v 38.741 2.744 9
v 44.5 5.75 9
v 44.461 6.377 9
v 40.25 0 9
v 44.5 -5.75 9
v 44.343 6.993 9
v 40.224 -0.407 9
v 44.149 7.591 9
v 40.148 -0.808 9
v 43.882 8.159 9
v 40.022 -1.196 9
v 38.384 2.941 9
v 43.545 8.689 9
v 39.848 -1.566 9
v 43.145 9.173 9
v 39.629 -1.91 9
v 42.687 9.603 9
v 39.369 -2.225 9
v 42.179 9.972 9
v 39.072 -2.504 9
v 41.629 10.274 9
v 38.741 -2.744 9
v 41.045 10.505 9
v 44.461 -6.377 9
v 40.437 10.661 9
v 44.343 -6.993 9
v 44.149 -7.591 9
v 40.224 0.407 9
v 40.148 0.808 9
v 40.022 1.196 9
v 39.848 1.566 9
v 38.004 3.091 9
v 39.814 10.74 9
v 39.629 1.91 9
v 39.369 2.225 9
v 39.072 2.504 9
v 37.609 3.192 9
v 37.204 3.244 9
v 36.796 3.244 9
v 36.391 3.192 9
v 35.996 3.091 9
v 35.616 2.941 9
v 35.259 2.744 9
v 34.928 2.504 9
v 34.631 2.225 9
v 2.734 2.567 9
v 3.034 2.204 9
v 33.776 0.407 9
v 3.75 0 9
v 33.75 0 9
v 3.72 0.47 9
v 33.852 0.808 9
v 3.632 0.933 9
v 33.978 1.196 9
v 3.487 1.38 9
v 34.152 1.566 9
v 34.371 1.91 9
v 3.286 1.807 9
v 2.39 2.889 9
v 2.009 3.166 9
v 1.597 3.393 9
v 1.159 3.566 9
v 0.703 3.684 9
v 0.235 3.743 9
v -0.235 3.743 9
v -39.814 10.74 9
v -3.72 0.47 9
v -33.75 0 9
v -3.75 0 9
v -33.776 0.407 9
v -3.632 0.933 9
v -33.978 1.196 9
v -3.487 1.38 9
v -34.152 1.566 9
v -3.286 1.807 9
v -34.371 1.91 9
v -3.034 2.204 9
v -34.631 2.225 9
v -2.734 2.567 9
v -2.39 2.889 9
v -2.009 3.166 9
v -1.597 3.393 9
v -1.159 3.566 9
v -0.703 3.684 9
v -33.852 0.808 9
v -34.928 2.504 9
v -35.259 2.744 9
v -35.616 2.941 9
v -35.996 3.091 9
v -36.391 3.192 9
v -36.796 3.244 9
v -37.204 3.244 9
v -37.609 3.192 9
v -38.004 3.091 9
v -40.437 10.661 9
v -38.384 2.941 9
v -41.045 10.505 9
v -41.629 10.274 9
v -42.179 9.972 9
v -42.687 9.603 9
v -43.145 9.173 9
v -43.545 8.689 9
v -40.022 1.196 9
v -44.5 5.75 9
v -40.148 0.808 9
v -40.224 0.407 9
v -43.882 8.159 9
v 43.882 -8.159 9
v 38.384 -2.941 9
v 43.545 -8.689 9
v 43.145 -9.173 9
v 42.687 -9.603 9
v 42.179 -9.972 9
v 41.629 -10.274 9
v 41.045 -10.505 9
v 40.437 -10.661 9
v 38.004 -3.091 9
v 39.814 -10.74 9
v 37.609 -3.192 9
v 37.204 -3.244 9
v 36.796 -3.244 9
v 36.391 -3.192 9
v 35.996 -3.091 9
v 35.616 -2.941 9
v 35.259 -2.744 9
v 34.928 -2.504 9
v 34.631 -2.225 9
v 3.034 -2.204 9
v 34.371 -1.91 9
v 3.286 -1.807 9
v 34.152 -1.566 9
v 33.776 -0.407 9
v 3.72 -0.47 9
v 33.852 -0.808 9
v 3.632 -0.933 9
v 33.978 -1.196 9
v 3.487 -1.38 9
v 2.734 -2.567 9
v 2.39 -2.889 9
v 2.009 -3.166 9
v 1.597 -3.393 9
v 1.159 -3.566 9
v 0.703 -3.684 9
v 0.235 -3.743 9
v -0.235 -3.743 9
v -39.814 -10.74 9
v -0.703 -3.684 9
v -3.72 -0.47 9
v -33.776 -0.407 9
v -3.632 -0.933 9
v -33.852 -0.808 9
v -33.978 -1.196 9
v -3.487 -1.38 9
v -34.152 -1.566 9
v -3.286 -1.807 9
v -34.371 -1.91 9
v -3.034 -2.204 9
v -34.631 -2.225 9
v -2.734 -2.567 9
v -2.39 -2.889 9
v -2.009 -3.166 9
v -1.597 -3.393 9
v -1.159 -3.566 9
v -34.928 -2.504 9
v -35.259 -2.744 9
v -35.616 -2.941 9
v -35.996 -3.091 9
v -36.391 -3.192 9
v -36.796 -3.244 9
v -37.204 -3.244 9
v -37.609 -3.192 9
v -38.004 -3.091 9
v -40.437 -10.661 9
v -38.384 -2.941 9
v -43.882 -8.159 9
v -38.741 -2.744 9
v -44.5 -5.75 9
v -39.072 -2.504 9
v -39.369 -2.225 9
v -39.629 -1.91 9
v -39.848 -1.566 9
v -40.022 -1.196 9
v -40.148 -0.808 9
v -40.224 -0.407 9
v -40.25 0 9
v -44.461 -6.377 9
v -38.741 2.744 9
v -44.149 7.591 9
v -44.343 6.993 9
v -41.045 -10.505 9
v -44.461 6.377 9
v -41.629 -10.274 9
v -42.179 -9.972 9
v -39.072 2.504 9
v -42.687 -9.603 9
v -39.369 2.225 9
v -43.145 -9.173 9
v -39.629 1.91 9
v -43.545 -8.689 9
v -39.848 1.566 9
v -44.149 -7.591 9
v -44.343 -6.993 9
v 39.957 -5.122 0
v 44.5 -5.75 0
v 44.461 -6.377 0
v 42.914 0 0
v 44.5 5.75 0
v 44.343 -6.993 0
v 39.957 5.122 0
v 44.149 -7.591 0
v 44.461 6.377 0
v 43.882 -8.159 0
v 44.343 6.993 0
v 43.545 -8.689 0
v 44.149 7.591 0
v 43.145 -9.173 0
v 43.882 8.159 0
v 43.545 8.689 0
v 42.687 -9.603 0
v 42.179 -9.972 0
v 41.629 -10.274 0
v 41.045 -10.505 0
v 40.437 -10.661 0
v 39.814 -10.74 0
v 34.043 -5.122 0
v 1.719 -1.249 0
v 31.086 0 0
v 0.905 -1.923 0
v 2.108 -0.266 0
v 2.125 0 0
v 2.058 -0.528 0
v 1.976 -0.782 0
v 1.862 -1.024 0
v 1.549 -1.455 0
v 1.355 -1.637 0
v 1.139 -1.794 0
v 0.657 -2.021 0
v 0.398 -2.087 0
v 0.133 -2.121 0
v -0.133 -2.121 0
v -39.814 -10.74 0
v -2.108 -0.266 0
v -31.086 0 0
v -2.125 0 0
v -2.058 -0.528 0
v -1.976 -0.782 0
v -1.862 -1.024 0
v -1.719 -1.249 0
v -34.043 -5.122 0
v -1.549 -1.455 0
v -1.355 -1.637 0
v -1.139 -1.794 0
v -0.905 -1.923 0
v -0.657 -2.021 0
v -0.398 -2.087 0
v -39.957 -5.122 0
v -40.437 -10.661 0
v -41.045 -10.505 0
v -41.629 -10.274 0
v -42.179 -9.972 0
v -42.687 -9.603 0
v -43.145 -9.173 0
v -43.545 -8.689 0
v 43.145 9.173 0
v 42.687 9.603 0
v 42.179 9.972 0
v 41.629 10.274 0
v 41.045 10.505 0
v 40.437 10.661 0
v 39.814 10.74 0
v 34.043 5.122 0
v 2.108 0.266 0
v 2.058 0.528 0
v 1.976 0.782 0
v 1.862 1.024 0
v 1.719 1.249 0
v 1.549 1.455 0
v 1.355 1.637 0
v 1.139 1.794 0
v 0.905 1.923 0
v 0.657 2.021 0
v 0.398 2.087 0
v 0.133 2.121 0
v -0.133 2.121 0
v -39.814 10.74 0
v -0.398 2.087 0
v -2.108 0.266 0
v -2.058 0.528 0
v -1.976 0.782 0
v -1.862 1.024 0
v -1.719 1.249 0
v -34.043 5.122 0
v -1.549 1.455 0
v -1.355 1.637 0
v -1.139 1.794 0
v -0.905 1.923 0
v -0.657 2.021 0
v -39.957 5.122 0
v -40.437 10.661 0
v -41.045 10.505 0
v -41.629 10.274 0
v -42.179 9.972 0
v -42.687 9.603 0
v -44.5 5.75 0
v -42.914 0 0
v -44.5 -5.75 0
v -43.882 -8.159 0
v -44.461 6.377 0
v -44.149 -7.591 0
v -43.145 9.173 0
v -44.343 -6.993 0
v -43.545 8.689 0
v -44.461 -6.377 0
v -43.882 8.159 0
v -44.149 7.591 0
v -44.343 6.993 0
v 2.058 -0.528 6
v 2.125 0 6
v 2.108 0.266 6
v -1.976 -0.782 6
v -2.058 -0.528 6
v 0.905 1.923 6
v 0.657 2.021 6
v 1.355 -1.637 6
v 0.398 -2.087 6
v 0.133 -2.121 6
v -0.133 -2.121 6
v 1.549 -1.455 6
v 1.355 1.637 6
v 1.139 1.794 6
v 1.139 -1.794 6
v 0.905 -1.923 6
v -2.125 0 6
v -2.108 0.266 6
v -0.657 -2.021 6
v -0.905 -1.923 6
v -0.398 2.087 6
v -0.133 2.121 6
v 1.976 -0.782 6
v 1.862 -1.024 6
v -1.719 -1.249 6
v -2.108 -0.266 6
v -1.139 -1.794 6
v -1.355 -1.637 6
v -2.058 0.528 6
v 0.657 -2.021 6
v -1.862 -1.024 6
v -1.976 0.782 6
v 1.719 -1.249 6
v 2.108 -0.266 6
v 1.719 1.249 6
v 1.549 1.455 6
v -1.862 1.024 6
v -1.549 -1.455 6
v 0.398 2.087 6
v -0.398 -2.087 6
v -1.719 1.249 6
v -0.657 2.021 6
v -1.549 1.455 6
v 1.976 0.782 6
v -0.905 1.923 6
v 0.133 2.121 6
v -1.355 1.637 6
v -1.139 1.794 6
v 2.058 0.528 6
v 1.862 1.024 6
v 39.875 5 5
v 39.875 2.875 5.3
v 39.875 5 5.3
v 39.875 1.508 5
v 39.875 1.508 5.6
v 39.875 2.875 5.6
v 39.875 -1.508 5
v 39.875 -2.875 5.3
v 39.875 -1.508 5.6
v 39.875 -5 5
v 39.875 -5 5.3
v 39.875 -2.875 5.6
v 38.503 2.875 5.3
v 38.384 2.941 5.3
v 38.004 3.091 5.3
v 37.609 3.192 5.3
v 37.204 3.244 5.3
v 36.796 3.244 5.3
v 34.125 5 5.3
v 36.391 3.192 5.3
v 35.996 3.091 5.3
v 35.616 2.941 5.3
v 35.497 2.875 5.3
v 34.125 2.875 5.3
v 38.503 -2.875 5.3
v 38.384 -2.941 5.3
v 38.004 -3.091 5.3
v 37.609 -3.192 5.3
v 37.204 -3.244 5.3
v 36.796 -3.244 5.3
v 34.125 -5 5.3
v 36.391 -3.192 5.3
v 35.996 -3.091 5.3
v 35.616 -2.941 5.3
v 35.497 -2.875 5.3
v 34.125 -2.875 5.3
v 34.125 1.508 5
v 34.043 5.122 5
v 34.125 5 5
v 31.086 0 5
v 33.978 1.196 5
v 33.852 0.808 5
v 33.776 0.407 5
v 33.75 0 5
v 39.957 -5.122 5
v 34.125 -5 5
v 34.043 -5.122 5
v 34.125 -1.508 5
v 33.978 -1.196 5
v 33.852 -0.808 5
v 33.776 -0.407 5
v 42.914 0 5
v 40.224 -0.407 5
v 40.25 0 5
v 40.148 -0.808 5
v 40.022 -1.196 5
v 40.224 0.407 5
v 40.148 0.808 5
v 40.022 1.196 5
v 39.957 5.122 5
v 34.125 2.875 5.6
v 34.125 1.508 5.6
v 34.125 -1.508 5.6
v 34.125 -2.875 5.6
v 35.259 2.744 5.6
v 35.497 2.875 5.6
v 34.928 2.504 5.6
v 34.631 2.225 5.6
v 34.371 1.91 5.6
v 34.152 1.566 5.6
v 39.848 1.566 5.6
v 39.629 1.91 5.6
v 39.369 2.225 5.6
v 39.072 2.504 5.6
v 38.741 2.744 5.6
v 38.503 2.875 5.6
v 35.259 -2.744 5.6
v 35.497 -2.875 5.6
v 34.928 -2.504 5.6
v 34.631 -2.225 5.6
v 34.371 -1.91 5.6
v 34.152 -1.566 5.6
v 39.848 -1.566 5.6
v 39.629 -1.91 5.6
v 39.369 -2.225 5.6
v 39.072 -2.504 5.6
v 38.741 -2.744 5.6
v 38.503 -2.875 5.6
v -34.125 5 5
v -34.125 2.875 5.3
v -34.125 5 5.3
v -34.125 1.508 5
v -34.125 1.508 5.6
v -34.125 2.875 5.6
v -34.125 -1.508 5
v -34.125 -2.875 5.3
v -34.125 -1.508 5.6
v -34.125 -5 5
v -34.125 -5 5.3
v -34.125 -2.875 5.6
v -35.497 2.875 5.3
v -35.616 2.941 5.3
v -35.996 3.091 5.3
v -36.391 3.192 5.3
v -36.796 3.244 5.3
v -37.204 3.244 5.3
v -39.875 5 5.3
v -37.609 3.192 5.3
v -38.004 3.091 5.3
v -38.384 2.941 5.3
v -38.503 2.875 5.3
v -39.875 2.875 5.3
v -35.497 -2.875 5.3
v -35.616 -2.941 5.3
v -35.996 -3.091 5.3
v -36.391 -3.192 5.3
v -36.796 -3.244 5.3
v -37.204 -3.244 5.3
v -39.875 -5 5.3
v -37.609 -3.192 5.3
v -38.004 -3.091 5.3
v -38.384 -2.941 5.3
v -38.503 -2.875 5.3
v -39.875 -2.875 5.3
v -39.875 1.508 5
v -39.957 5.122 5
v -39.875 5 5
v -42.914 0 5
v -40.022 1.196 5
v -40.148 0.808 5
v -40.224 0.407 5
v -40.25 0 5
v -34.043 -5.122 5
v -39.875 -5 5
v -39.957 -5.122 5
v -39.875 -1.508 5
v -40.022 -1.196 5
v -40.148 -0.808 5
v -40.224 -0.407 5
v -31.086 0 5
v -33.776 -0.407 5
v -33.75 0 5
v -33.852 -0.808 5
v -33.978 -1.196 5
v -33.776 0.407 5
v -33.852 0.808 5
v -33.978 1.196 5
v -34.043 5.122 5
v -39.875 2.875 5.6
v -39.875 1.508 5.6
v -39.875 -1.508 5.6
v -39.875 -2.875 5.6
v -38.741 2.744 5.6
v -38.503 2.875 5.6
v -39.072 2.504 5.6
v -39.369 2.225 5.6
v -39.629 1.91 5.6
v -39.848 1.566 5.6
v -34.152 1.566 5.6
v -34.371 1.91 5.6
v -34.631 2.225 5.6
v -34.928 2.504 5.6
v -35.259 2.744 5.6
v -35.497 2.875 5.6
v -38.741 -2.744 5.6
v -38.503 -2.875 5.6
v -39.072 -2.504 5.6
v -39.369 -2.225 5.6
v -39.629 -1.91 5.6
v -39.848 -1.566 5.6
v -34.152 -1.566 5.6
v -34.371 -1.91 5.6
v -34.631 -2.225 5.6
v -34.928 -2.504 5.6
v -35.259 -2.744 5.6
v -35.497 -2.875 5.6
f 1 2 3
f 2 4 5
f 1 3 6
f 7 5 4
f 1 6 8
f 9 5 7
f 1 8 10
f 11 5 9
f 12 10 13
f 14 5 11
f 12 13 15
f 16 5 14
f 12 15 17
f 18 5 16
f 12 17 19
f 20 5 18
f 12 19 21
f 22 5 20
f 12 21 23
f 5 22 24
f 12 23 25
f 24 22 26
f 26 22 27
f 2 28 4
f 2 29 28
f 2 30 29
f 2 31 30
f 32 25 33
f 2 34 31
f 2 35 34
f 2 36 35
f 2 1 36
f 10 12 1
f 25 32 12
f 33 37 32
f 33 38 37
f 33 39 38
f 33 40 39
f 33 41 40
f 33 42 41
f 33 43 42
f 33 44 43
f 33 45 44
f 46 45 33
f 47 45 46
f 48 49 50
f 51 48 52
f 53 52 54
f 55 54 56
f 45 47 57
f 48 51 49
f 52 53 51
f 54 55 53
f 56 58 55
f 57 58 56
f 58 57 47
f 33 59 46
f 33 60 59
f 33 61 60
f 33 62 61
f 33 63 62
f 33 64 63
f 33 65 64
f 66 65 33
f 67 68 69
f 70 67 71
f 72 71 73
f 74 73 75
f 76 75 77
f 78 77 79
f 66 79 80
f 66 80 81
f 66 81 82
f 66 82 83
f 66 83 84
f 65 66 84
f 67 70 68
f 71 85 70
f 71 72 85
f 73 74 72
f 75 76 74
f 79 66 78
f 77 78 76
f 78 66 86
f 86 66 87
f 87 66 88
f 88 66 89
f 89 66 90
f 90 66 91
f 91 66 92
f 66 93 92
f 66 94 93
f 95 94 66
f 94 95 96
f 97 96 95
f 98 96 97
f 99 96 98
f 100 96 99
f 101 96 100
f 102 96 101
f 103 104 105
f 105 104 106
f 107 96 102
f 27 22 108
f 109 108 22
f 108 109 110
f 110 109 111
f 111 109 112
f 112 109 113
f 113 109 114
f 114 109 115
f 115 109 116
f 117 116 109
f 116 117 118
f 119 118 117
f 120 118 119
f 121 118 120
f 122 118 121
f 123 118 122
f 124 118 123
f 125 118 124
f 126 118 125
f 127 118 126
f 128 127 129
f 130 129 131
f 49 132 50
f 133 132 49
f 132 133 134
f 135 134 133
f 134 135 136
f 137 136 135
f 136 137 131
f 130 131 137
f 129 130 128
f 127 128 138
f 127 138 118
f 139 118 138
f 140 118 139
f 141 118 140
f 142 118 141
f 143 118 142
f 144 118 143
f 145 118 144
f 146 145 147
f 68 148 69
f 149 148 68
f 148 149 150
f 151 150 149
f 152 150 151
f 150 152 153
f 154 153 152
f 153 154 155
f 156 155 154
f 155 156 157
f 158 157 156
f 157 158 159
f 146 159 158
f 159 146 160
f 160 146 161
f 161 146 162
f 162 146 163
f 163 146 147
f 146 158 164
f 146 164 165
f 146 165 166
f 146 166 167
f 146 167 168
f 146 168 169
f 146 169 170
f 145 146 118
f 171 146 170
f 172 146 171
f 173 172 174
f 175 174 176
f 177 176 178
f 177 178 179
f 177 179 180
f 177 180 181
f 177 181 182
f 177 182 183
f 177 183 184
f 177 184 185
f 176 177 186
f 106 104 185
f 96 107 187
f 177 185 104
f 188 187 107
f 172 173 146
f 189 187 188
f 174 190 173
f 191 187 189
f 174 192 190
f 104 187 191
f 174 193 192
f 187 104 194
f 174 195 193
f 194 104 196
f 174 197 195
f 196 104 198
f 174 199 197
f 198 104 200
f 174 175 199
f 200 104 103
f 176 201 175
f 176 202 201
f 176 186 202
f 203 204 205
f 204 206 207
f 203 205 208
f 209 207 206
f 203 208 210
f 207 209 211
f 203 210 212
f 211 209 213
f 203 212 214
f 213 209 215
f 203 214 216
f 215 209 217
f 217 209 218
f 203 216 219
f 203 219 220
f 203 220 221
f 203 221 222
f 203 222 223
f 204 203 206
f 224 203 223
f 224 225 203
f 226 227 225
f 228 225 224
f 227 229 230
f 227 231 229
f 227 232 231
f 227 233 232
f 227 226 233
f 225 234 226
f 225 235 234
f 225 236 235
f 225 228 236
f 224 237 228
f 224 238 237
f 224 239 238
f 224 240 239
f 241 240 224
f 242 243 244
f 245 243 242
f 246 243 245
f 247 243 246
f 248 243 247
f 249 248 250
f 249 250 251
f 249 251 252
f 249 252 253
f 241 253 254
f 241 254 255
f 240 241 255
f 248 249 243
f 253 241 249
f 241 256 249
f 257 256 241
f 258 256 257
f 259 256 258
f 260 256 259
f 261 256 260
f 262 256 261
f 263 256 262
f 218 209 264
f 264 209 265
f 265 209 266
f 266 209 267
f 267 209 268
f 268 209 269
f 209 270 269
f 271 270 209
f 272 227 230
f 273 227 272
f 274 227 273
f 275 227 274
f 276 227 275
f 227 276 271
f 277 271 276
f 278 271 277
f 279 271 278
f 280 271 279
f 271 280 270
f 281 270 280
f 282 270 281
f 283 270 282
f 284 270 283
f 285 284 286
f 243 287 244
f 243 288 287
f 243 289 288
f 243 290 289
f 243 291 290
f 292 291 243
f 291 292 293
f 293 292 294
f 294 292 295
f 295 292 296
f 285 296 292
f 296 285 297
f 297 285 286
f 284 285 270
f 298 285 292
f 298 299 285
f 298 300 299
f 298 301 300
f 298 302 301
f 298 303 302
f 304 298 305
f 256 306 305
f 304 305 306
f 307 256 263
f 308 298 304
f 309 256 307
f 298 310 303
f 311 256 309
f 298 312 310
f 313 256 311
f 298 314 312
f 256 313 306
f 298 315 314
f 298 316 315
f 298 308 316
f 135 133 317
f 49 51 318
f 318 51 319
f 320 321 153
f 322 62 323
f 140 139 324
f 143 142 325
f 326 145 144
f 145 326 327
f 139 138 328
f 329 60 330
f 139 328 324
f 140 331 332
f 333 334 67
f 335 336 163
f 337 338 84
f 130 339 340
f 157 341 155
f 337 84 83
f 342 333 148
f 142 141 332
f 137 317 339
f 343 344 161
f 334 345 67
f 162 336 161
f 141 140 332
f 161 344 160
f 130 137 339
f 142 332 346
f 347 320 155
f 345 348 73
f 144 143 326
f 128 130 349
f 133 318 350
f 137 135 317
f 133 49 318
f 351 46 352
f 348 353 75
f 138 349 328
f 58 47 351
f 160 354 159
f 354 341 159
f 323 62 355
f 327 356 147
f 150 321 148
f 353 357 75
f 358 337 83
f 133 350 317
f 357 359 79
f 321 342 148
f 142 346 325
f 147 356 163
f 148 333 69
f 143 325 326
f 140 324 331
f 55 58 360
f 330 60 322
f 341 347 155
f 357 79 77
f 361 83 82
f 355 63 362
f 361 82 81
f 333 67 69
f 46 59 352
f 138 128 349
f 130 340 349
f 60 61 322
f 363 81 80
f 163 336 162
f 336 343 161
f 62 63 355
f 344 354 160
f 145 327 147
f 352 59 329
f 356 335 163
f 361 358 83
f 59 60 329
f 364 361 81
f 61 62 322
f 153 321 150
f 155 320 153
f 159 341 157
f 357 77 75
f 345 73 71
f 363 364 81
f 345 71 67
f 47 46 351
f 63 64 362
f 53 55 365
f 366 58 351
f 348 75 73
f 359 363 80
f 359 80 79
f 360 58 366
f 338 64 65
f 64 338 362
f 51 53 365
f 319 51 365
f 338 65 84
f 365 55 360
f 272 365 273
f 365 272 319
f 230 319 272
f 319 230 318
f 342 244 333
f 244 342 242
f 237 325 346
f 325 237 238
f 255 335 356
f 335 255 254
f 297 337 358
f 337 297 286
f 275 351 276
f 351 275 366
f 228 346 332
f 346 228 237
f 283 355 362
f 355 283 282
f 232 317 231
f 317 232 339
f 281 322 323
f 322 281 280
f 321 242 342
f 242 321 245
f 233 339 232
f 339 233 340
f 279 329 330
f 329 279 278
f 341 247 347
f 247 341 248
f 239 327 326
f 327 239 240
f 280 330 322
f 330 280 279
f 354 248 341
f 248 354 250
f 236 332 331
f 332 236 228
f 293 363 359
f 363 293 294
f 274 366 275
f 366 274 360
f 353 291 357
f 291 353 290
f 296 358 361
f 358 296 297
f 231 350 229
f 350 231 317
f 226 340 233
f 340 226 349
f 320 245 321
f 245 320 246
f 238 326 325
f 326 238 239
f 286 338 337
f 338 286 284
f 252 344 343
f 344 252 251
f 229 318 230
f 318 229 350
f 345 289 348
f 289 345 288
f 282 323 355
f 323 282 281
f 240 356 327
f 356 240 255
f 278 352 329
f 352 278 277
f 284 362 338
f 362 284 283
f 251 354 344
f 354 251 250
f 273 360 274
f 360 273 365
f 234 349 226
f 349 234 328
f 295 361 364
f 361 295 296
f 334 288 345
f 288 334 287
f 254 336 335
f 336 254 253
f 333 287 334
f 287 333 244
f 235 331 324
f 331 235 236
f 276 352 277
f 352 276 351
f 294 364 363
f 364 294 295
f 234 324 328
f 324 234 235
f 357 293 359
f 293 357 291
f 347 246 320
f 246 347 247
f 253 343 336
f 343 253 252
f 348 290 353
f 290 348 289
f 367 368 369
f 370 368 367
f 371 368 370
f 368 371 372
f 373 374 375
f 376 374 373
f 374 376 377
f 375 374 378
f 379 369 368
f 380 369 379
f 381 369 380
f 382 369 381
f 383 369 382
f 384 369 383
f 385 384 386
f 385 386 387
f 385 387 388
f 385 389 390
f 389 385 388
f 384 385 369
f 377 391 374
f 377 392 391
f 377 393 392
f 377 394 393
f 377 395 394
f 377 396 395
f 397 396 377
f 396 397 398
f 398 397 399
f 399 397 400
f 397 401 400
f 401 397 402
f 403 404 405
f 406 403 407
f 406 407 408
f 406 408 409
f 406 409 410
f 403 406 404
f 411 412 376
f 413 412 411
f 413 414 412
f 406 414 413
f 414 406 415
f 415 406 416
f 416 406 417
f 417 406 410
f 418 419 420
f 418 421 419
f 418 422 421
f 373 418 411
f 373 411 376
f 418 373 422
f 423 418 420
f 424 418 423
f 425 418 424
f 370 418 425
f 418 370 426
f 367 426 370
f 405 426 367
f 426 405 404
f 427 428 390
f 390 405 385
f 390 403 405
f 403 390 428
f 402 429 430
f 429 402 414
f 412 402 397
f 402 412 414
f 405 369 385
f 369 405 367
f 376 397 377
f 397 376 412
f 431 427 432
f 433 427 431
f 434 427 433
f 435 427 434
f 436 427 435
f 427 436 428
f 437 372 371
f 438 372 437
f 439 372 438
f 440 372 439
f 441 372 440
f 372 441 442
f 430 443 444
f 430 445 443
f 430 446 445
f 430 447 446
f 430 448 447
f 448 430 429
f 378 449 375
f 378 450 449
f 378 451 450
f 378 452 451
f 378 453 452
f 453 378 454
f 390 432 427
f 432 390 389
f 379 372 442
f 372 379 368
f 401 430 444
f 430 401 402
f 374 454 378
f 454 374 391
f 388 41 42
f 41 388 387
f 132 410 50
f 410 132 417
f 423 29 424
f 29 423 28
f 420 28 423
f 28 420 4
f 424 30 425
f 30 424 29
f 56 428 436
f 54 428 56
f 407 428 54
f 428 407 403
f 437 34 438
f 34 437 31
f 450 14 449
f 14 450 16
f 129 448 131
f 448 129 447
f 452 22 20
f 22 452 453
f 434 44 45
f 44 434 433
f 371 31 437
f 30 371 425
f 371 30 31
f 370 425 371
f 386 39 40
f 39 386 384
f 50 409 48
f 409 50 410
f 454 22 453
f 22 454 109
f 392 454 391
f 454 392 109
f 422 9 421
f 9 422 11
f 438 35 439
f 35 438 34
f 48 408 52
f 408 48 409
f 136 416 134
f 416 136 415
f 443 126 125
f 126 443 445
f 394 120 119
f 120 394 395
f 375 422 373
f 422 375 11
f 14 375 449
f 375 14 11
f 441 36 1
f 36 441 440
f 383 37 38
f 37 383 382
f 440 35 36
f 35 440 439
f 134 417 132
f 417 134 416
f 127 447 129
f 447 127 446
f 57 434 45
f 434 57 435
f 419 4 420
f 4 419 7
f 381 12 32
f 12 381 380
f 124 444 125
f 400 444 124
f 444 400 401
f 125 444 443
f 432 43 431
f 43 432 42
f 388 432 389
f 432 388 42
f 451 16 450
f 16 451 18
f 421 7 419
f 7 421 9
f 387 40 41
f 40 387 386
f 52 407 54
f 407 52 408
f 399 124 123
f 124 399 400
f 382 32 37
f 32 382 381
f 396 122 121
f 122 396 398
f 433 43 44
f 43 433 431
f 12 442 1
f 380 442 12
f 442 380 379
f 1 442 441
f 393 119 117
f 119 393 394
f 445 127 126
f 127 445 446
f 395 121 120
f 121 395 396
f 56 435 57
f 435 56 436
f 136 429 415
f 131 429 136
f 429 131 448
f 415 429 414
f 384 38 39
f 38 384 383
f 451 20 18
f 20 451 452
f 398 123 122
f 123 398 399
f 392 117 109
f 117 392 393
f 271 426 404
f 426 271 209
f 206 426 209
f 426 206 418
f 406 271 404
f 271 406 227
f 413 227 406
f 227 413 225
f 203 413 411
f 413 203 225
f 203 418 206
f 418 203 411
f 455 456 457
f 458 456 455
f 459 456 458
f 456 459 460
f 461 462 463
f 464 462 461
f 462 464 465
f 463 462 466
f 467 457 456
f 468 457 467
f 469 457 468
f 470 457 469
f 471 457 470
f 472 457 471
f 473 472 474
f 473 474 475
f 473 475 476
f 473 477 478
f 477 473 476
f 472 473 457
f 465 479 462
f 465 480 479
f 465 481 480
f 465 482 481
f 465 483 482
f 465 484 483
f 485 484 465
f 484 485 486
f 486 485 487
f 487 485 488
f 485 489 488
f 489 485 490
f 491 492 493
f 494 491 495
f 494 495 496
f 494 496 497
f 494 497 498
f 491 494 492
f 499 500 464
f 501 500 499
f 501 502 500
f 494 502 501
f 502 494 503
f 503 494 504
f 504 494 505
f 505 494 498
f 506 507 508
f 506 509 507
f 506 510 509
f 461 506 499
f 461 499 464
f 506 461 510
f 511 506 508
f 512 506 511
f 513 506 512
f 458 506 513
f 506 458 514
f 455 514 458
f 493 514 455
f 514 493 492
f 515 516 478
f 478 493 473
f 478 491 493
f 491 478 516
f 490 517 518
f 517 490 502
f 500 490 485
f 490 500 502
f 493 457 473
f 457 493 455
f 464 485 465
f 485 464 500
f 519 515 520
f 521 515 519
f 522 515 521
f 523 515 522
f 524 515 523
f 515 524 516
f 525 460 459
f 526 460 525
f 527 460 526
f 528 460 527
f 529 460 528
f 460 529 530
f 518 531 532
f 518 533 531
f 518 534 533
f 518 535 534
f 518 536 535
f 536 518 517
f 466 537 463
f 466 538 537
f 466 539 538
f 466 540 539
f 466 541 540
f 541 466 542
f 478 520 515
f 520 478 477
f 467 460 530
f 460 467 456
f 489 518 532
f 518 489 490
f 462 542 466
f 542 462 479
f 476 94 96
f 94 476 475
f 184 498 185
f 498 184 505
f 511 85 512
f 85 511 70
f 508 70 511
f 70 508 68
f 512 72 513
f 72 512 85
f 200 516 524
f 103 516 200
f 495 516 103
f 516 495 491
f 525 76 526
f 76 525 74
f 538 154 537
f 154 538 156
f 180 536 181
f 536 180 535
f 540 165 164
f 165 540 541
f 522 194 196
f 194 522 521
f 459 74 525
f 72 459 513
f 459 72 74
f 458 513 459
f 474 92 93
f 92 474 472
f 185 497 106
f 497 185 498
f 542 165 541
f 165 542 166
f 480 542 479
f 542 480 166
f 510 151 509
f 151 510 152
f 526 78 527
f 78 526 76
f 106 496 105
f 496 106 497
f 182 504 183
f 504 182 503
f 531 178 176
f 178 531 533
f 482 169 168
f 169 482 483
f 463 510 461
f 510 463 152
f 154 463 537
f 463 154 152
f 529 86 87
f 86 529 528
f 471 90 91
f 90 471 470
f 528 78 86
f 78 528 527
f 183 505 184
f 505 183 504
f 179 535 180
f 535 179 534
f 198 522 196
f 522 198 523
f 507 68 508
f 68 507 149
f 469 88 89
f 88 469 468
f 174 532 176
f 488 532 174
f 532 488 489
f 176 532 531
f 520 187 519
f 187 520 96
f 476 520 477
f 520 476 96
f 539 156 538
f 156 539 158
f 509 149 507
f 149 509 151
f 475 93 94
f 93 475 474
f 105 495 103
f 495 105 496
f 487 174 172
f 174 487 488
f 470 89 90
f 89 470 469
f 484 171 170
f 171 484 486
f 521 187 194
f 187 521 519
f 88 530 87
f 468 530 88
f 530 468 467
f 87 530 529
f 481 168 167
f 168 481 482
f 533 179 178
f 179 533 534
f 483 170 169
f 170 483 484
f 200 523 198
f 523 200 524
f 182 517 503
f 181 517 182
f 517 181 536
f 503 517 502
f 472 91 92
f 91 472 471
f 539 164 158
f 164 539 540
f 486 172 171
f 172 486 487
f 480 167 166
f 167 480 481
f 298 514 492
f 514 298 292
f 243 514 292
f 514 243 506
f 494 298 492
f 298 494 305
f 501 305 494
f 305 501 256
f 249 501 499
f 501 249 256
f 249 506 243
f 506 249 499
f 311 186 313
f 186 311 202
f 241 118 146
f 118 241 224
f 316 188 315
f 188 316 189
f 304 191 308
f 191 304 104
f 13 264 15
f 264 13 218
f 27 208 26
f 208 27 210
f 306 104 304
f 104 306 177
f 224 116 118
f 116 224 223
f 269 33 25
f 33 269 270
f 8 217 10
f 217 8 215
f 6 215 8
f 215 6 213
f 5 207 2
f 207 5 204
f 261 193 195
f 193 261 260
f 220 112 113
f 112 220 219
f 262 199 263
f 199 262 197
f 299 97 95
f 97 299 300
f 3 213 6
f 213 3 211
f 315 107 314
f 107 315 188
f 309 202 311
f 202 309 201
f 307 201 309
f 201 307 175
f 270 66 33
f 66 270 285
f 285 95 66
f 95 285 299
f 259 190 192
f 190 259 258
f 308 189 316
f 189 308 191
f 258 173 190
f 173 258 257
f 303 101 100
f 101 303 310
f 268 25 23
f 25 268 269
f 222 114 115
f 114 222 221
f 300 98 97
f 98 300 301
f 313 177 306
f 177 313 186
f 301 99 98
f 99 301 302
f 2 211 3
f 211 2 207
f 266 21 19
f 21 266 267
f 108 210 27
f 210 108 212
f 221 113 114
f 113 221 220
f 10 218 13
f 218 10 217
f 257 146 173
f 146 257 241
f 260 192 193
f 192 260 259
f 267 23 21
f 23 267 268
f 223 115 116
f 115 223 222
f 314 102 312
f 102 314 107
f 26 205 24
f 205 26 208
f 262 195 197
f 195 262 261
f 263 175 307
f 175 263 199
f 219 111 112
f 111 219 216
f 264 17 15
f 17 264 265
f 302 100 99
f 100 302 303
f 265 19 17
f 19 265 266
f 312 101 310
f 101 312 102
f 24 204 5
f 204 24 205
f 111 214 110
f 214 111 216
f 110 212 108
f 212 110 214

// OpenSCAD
$fn = 50;


difference() {
	union() {
		hull() {
			translate(v = [-39.5000000000, 5.7500000000, 0]) {
				cylinder(h = 9, r = 5);
			}
			translate(v = [39.5000000000, 5.7500000000, 0]) {
				cylinder(h = 9, r = 5);
			}
			translate(v = [-39.5000000000, -5.7500000000, 0]) {
				cylinder(h = 9, r = 5);
			}
			translate(v = [39.5000000000, -5.7500000000, 0]) {
				cylinder(h = 9, r = 5);
			}
		}
	}
	union() {
		translate(v = [0, 0, 9]) {
			rotate(a = [0, 0, 0]) {
				difference() {
					union() {
						#translate(v = [0, 0, -9.0000000000]) {
							cylinder(h = 9, r = 2.0000000000);
						}
						#translate(v = [0, 0, -3]) {
							cylinder(h = 3, r1 = 2.1250000000, r2 = 3.7500000000);
						}
						#translate(v = [0, 0, -9.0000000000]) {
							cylinder(h = 9, r = 2.1250000000);
						}
						#translate(v = [0, 0, -9.0000000000]) {
							cylinder(h = 9, r = 2.0000000000);
						}
					}
					union();
				}
			}
		}
		translate(v = [37.0000000000, 0, 0]) {
			rotate(a = [0, 0, 0]) {
				difference() {
					union() {
						#translate(v = [-2.8750000000, -5.0000000000, -0.3000000000]) {
							cube(size = [5.7500000000, 10, 0.3000000000]);
						}
						#translate(v = [-2.8750000000, -2.8750000000, -0.6000000000]) {
							cube(size = [5.7500000000, 5.7500000000, 0.3000000000]);
						}
						#translate(v = [-2.8750000000, -5.0000000000, 5]) {
							cube(size = [5.7500000000, 10, 0.3000000000]);
						}
						#translate(v = [-2.8750000000, -2.8750000000, 5.3000000000]) {
							cube(size = [5.7500000000, 5.7500000000, 0.3000000000]);
						}
						#translate(v = [0, 0, -100.0000000000]) {
							cylinder(h = 200, r = 3.2500000000);
						}
						#linear_extrude(height = 5) {
							polygon(points = [[5.9142500000, 0.0000000000], [2.9571250000, 5.1218907443], [-2.9571250000, 5.1218907443], [-5.9142500000, 0.0000000000], [-2.9571250000, -5.1218907443], [2.9571250000, -5.1218907443]]);
						}
						#translate(v = [-2.8750000000, -5.0000000000, -0.3000000000]) {
							cube(size = [5.7500000000, 10, 0.3000000000]);
						}
						#translate(v = [-2.8750000000, -2.8750000000, -0.6000000000]) {
							cube(size = [5.7500000000, 5.7500000000, 0.3000000000]);
						}
						#translate(v = [-2.8750000000, -5.0000000000, 5]) {
							cube(size = [5.7500000000, 10, 0.3000000000]);
						}
						#translate(v = [-2.8750000000, -2.8750000000, 5.3000000000]) {
							cube(size = [5.7500000000, 5.7500000000, 0.3000000000]);
						}
						#translate(v = [0, 0, -100.0000000000]) {
							cylinder(h = 200, r = 3.2500000000);
						}
						#translate(v = [-2.8750000000, -5.0000000000, -0.3000000000]) {
							cube(size = [5.7500000000, 10, 0.3000000000]);
						}
						#translate(v = [-2.8750000000, -2.8750000000, -0.6000000000]) {
							cube(size = [5.7500000000, 5.7500000000, 0.3000000000]);
						}
						#translate(v = [-2.8750000000, -5.0000000000, 5]) {
							cube(size = [5.7500000000, 10, 0.3000000000]);
						}
						#translate(v = [-2.8750000000, -2.8750000000, 5.3000000000]) {
							cube(size = [5.7500000000, 5.7500000000, 0.3000000000]);
						}
						#translate(v = [0, 0, -100.0000000000]) {
							cylinder(h = 200, r = 3.2500000000);
						}
					}
					union();
				}
			}
		}
		translate(v = [-37.0000000000, 0, 0]) {
			rotate(a = [0, 0, 0]) {
				difference() {
					union() {
						#translate(v = [-2.8750000000, -5.0000000000, -0.3000000000]) {
							cube(size = [5.7500000000, 10, 0.3000000000]);
						}
						#translate(v = [-2.8750000000, -2.8750000000, -0.6000000000]) {
							cube(size = [5.7500000000, 5.7500000000, 0.3000000000]);
						}
						#translate(v = [-2.8750000000, -5.0000000000, 5]) {
							cube(size = [5.7500000000, 10, 0.3000000000]);
						}
						#translate(v = [-2.8750000000, -2.8750000000, 5.3000000000]) {
							cube(size = [5.7500000000, 5.7500000000, 0.3000000000]);
						}
						#translate(v = [0, 0, -100.0000000000]) {
							cylinder(h = 200, r = 3.2500000000);
						}
						#linear_extrude(height = 5) {
							polygon(points = [[5.9142500000, 0.0000000000], [2.9571250000, 5.1218907443], [-2.9571250000, 5.1218907443], [-5.9142500000, 0.0000000000], [-2.9571250000, -5.1218907443], [2.9571250000, -5.1218907443]]);
						}
						#translate(v = [-2.8750000000, -5.0000000000, -0.3000000000]) {
							cube(size = [5.7500000000, 10, 0.3000000000]);
						}
						#translate(v = [-2.8750000000, -2.8750000000, -0.6000000000]) {
							cube(size = [5.7500000000, 5.7500000000, 0.3000000000]);
						}
						#translate(v = [-2.8750000000, -5.0000000000, 5]) {
							cube(size = [5.7500000000, 10, 0.3000000000]);
						}
						#translate(v = [-2.8750000000, -2.8750000000, 5.3000000000]) {
							cube(size = [5.7500000000, 5.7500000000, 0.3000000000]);
						}
						#translate(v = [0, 0, -100.0000000000]) {
							cylinder(h = 200, r = 3.2500000000);
						}
						#translate(v = [-2.8750000000, -5.0000000000, -0.3000000000]) {
							cube(size = [5.7500000000, 10, 0.3000000000]);
						}
						#translate(v = [-2.8750000000, -2.8750000000, -0.6000000000]) {
							cube(size = [5.7500000000, 5.7500000000, 0.3000000000]);
						}
						#translate(v = [-2.8750000000, -5.0000000000, 5]) {
							cube(size = [5.7500000000, 10, 0.3000000000]);
						}
						#translate(v = [-2.8750000000, -2.8750000000, 5.3000000000]) {
							cube(size = [5.7500000000, 5.7500000000, 0.3000000000]);
						}
						#translate(v = [0, 0, -100.0000000000]) {
							cylinder(h = 200, r = 3.2500000000);
						}
					}
					union();
				}
			}
		}
	}
}
